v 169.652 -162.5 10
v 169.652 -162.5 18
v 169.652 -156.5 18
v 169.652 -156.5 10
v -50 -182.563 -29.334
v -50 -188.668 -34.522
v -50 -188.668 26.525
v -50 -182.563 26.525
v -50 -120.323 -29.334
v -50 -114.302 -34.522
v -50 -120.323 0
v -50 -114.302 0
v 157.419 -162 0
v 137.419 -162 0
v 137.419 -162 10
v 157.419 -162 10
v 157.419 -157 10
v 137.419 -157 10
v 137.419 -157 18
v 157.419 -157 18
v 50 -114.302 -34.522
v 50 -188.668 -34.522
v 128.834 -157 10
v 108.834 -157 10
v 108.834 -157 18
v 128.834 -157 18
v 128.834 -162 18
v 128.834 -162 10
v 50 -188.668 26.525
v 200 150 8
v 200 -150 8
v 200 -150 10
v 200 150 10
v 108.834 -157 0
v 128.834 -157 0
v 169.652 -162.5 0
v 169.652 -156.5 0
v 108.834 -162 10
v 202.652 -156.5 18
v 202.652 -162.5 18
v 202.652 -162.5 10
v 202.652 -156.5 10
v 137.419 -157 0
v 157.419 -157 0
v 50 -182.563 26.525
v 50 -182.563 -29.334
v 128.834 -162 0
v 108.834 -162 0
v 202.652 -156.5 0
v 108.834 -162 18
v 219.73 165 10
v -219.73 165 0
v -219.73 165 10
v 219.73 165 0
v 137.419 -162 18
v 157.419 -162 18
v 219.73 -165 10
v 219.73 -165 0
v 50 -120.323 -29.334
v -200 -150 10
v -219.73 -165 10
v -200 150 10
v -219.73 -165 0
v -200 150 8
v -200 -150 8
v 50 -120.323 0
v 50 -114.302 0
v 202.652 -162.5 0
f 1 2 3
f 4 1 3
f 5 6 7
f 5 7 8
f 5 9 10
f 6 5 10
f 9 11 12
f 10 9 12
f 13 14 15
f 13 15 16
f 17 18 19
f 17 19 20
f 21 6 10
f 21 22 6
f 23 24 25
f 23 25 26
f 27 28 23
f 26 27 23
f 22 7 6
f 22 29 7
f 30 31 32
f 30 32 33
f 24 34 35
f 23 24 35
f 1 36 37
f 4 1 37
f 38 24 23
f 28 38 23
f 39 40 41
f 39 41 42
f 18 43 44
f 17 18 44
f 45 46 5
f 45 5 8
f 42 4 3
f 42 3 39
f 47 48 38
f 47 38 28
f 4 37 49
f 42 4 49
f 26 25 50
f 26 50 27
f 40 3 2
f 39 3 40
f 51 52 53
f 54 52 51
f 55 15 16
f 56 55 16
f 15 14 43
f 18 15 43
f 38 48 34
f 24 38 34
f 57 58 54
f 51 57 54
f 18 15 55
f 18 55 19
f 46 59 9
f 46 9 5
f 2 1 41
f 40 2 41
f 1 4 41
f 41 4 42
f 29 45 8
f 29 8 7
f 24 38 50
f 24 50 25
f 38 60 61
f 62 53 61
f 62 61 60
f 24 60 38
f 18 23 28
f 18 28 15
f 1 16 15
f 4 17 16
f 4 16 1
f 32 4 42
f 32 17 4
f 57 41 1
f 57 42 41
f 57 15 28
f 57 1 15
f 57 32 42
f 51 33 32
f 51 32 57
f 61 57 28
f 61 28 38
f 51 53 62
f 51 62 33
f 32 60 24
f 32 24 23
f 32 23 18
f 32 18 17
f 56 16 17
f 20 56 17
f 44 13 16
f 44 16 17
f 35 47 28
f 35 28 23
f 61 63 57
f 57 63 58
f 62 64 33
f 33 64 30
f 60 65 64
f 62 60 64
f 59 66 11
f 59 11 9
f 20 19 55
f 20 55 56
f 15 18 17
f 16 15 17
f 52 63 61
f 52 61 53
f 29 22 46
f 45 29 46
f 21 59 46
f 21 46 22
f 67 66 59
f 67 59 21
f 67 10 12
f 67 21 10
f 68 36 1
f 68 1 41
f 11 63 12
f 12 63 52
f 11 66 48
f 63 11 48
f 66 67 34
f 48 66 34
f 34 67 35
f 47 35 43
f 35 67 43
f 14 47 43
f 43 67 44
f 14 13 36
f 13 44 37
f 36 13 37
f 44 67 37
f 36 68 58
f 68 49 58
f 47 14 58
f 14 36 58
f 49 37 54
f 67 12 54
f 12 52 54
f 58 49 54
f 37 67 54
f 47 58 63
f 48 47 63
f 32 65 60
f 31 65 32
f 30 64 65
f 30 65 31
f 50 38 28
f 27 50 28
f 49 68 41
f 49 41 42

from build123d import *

# Parameters (mm, degrees)
F0_W     = 439.460694
F0_H     = 330
F0_W_2   = 20
F0_H_2   = 5
F0_W_3   = 33
F0_H_3   = 6
F0_W_4   = 400
F0_H_4   = 300
F1_DEPTH = 10
F2_W     = 402
F2_H     = 302
F3_DEPTH = 8
F5_DEPTH = 50
F6_W     = 33
F6_H     = 6
F6_W_2   = 20
F6_H_2   = 5
F7_DEPTH = 8


with BuildPart() as f1:
    # F0 (on Top) → F1 (new body)
    with BuildSketch(Plane.XY):
        Rectangle(F0_W, F0_H)
        with Locations((118.833594, -159.5)):
            Rectangle(F0_W_2, F0_H_2, mode=Mode.SUBTRACT)
        with Locations((147.418872, -159.5)):
            Rectangle(F0_W_2, F0_H_2, mode=Mode.SUBTRACT)
        with Locations((186.151851, -159.5)):
            Rectangle(F0_W_3, F0_H_3, mode=Mode.SUBTRACT)
        Rectangle(F0_W_4, F0_H_4, mode=Mode.SUBTRACT)
    extrude(amount=F1_DEPTH)

    # F2 (on Top) → F3 (join)
    with BuildSketch(Plane.XY):
        with Locations((-0.93753, -0.534642)):
            Rectangle(F2_W, F2_H)
    extrude(amount=F3_DEPTH)

    # F4 (on Right) → F5 (join, symmetric)
    with BuildSketch(Plane.YZ):
        Polygon((-114.302076, -34.522139), (-114.302076, 0), (-120.323472, 0), (-120.323472, -29.334145), (-182.563469, -29.334145), (-182.563469, 26.524637), (-188.668147, 26.524637), (-188.668147, -34.522139), align=None)
    extrude(amount=F5_DEPTH, both=True)


with BuildPart() as f7:
    # F6 (on face) → F7 (new body)
    with BuildSketch(Plane.XY.offset(10)):
        with Locations((186.151851, -159.5)):
            Rectangle(F6_W, F6_H)
        with Locations((147.418872, -159.5)):
            Rectangle(F6_W_2, F6_H_2)
        with Locations((118.833594, -159.5)):
            Rectangle(F6_W_2, F6_H_2)
    extrude(amount=F7_DEPTH)


solid = Compound([f1.part, f7.part])
